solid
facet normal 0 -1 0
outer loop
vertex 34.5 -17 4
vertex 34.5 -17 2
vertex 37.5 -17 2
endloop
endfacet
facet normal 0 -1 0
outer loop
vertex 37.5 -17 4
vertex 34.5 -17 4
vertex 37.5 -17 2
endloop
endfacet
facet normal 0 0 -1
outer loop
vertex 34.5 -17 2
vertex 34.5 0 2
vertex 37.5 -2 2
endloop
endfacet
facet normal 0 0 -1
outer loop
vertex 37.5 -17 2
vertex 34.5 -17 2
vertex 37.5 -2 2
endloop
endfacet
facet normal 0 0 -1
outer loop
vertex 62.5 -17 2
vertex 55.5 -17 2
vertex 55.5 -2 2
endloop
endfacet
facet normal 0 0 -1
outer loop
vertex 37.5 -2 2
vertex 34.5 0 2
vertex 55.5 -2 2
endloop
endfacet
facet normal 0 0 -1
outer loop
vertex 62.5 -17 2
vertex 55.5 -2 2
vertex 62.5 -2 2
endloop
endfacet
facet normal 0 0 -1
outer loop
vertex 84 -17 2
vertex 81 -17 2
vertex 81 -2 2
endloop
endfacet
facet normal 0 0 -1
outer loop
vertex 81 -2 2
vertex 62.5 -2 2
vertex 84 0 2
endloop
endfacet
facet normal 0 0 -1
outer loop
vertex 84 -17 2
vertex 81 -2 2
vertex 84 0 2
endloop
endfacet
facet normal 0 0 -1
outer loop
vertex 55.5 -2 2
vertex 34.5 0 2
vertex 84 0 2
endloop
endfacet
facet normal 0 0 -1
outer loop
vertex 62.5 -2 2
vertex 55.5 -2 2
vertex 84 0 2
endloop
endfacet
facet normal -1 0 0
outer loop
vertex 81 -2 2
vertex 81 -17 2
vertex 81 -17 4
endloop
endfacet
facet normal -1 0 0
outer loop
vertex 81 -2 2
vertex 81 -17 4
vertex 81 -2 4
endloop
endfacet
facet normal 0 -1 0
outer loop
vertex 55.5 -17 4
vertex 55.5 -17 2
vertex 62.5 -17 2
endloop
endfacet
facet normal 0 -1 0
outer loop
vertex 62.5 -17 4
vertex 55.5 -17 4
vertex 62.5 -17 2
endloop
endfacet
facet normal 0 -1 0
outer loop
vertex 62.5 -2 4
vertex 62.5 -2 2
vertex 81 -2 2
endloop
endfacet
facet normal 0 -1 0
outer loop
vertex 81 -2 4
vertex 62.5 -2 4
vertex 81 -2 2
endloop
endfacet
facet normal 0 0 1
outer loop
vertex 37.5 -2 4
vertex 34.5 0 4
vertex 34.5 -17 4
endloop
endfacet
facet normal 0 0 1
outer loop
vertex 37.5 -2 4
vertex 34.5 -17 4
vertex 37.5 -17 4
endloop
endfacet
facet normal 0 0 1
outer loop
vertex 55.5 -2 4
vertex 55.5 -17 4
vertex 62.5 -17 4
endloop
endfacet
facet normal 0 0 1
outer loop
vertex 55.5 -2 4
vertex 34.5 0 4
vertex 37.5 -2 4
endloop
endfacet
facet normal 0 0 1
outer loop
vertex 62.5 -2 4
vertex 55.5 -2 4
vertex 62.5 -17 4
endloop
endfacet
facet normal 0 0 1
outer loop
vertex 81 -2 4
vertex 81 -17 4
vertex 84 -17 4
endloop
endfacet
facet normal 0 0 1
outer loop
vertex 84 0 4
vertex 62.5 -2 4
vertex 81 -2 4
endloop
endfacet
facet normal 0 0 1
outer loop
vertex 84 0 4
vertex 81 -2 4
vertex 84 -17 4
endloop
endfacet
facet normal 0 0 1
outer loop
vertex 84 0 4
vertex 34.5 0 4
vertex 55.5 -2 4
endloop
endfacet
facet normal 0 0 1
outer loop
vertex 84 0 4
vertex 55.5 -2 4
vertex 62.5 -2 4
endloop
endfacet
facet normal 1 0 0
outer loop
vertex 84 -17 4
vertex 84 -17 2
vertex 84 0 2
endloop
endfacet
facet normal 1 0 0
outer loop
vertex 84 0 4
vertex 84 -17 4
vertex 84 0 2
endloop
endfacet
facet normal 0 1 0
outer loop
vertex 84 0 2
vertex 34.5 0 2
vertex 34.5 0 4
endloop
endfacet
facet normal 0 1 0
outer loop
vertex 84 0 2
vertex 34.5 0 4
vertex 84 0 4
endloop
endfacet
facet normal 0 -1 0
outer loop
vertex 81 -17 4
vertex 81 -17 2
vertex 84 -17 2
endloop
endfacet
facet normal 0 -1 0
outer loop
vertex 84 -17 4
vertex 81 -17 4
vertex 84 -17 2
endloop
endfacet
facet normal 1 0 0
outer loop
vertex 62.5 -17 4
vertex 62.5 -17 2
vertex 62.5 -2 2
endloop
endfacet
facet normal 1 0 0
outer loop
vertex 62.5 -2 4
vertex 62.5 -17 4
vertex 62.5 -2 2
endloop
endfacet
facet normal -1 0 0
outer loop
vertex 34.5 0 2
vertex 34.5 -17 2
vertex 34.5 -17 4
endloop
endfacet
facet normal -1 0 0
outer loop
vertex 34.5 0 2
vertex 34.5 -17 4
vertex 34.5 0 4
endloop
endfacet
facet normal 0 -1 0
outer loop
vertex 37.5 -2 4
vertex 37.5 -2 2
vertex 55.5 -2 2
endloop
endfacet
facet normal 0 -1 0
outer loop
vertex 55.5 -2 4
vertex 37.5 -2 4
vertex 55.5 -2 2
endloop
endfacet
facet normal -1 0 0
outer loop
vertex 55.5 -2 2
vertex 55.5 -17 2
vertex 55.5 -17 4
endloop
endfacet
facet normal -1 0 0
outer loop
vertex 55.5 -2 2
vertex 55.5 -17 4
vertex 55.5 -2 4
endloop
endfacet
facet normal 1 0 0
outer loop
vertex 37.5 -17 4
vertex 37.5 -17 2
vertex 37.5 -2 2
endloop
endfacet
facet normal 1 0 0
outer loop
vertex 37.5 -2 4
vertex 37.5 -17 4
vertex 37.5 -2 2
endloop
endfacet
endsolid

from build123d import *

# Parameters (mm, degrees)
BOX142_W     = 49.5
BOX142_H     = 2
BOX142_DEPTH = 2
BOX143_W     = 3
BOX143_H     = 15
BOX143_DEPTH = 2
BOX144_W     = 3
BOX144_H     = 15
BOX144_DEPTH = 2
BOX139_W     = 7
BOX139_H     = 15
BOX139_DEPTH = 2


with BuildPart() as cube131:
    # Box142 → Box142 (new body)
    with BuildSketch(Plane(origin=(34.5, -2, 2), x_dir=(1, 0, 0), z_dir=(0, 0, 1))):
        with Locations((24.75, 1)):
            Rectangle(BOX142_W, BOX142_H)
    extrude(amount=BOX142_DEPTH)


with BuildPart() as cube132:
    # Box143 → Box143 (new body)
    with BuildSketch(Plane(origin=(34.5, -17, 2), x_dir=(1, 0, 0), z_dir=(0, 0, 1))):
        with Locations((1.5, 7.5)):
            Rectangle(BOX143_W, BOX143_H)
    extrude(amount=BOX143_DEPTH)


with BuildPart() as cube133:
    # Box144 → Box144 (new body)
    with BuildSketch(Plane(origin=(81, -17, 2), x_dir=(1, 0, 0), z_dir=(0, 0, 1))):
        with Locations((1.5, 7.5)):
            Rectangle(BOX144_W, BOX144_H)
    extrude(amount=BOX144_DEPTH)


with BuildPart() as fusion047:
    # Box139 → Box139 (new body)
    with BuildSketch(Plane(origin=(55.5, -17, 2), x_dir=(1, 0, 0), z_dir=(0, 0, 1))):
        with Locations((3.5, 7.5)):
            Rectangle(BOX139_W, BOX139_H)
    extrude(amount=BOX139_DEPTH)

    # Fusion047: union Cube131, Cube132, Cube133
    add(cube131.part)
    add(cube132.part)
    add(cube133.part)


solid = fusion047.part
